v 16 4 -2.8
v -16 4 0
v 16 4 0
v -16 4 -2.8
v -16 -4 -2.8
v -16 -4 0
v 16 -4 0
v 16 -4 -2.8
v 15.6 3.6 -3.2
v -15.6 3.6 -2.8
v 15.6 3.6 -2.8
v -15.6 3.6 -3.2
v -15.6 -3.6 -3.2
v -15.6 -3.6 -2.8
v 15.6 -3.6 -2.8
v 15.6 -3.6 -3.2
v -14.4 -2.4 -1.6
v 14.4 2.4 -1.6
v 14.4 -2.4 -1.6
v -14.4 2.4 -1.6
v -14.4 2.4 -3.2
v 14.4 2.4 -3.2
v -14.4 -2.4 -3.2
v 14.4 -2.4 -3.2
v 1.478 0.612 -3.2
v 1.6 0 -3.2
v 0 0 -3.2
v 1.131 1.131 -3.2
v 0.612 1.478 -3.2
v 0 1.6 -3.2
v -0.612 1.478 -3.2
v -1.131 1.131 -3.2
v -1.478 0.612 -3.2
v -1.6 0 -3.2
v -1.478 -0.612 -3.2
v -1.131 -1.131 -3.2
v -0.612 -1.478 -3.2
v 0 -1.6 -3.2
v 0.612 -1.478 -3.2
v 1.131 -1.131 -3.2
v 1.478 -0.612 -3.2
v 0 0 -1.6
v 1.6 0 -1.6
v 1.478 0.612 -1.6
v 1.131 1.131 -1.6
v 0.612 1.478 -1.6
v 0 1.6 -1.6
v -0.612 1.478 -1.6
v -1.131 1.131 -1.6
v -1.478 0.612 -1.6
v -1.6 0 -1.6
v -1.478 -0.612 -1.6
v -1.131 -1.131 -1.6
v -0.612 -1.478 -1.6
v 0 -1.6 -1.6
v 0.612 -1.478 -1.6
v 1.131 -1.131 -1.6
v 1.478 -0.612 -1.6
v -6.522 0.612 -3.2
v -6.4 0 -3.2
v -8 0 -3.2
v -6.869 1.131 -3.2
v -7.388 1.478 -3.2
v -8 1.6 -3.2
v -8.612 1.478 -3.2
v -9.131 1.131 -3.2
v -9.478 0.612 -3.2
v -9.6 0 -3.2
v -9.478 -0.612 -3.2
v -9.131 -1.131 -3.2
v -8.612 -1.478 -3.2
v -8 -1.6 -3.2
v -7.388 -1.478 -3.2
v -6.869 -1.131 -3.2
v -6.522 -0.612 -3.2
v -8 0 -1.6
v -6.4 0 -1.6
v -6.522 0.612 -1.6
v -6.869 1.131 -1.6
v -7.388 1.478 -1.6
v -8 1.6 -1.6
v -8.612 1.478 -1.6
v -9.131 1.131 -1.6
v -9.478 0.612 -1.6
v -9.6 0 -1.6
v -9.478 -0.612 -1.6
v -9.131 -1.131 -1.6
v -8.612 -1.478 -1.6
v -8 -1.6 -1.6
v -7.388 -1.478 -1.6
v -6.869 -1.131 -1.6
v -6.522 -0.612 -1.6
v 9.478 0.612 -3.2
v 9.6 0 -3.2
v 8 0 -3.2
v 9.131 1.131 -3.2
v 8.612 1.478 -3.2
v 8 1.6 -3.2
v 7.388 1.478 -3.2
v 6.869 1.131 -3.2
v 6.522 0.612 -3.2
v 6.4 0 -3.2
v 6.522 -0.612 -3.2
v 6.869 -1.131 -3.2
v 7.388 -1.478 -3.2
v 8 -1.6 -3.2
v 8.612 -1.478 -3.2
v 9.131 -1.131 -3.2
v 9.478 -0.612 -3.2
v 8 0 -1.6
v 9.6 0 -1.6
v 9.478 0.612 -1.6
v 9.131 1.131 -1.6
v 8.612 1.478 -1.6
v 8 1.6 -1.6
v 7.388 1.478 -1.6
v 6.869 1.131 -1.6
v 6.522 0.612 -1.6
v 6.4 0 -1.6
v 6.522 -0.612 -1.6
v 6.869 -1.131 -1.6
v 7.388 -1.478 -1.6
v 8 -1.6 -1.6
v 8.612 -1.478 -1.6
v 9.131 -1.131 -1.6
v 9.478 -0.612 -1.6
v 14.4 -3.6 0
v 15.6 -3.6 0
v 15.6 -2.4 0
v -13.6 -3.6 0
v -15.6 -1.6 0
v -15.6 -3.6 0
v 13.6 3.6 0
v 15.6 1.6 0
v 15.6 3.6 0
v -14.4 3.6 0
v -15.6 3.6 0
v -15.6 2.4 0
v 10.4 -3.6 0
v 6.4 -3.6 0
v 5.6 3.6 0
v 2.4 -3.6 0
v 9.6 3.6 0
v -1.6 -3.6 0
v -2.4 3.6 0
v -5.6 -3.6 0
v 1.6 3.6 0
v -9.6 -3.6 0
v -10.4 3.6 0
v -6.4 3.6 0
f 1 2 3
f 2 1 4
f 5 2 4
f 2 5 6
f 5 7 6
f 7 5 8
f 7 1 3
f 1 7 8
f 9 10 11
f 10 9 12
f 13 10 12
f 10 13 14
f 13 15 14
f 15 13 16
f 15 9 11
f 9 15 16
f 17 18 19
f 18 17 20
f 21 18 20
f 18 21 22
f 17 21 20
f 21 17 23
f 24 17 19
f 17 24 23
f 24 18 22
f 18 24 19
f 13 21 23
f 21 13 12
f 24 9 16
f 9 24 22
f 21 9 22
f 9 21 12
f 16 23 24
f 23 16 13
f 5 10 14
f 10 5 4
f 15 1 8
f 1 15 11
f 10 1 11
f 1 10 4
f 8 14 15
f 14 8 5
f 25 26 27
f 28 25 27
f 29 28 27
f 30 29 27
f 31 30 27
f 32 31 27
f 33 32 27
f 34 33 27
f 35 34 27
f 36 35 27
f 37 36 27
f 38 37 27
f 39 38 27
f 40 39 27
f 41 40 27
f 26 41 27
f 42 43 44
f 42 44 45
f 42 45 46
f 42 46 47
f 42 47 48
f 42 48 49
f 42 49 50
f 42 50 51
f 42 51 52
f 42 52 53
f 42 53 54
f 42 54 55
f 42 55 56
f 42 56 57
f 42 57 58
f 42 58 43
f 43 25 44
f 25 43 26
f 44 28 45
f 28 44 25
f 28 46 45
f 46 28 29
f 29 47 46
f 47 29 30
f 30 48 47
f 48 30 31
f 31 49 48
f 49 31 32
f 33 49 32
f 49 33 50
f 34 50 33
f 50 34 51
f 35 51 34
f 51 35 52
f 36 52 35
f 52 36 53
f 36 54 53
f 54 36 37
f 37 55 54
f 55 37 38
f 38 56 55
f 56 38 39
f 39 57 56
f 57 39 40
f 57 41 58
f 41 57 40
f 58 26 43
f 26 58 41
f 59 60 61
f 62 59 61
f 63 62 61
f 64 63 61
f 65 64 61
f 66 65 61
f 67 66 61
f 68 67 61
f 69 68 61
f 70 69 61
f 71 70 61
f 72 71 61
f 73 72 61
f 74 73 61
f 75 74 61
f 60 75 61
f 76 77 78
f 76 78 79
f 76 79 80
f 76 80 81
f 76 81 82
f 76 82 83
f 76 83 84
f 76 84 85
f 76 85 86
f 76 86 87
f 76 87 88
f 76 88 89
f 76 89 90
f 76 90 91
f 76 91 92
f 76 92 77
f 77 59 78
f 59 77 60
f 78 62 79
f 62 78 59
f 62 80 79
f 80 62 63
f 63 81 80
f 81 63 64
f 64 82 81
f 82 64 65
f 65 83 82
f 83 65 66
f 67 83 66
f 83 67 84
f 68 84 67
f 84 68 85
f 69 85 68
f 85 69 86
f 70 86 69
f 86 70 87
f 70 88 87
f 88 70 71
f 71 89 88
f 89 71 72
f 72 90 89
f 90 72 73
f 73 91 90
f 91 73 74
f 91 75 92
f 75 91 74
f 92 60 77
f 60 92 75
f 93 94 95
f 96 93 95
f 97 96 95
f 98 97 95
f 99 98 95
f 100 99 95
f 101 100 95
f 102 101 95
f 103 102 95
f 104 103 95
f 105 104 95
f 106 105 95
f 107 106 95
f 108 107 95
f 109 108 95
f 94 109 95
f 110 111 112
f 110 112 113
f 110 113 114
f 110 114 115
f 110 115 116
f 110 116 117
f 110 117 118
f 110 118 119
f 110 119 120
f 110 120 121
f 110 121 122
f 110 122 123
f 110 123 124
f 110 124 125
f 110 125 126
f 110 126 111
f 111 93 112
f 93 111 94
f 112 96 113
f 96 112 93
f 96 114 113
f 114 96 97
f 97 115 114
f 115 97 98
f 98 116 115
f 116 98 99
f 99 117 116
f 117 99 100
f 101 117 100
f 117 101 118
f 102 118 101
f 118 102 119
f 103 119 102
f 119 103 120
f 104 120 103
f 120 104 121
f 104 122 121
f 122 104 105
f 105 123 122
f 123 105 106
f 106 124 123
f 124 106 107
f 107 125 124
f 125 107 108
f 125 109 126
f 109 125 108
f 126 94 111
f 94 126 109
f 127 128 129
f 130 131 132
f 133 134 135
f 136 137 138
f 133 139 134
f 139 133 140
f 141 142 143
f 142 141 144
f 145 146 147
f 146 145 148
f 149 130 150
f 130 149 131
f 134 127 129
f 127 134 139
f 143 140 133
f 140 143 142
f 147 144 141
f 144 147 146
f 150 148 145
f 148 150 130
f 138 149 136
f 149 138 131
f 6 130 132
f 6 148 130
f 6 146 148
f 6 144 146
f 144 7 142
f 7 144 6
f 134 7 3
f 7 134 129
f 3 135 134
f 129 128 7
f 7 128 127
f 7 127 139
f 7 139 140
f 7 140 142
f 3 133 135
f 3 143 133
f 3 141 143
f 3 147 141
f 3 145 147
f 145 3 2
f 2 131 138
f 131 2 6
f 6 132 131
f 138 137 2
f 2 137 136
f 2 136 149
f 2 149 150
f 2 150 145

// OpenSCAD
// file: ../p/4-4edge.scad
use <../lib.scad>
function ldraw_lib__4_4edge() = [
// 0 Circle 1.0
// 0 Name: 4-4edge.dat
// 0 Author: James Jessiman
// 0 !LDRAW_ORG Primitive UPDATE 2017-01
// 0 !LICENSE Licensed under CC BY 2.0 and CC BY 4.0 : see CAreadme.txt
// 
// 0 BFC CERTIFY CCW
  [0,"BFC","CERTIFY"],
  [0,"BFC","CCW"],
// 
// 0 !HISTORY 1998-12-15 [PTadmin] Official Update 1998-10
// 0 !HISTORY 2005-12-28 [PTadmin] Official Update 2005-01
// 0 !HISTORY 2007-06-24 [PTadmin] Header formatted for Contributor Agreement
// 0 !HISTORY 2008-07-01 [PTadmin] Official Update 2008-01
// 0 !HISTORY 2017-01-15 [Steffen] BFCed
// 0 !HISTORY 2017-12-30 [PTadmin] Official Update 2017-01
// 
// 
// 2 24 1 0 0 0.9239 0 0.3827
  [2,24,1,0,0,0.9239,0,0.3827],
// 2 24 0.9239 0 0.3827 0.7071 0 0.7071
  [2,24,0.9239,0,0.3827,0.7071,0,0.7071],
// 2 24 0.7071 0 0.7071 0.3827 0 0.9239
  [2,24,0.7071,0,0.7071,0.3827,0,0.9239],
// 2 24 0.3827 0 0.9239 0 0 1
  [2,24,0.3827,0,0.9239,0,0,1],
// 2 24 0 0 1 -0.3827 0 0.9239
  [2,24,0,0,1,-0.3827,0,0.9239],
// 2 24 -0.3827 0 0.9239 -0.7071 0 0.7071
  [2,24,-0.3827,0,0.9239,-0.7071,0,0.7071],
// 2 24 -0.7071 0 0.7071 -0.9239 0 0.3827
  [2,24,-0.7071,0,0.7071,-0.9239,0,0.3827],
// 2 24 -0.9239 0 0.3827 -1 0 -0
  [2,24,-0.9239,0,0.3827,-1,0,-0],
// 2 24 -1 0 -0 -0.9239 0 -0.3827
  [2,24,-1,0,-0,-0.9239,0,-0.3827],
// 2 24 -0.9239 0 -0.3827 -0.7071 0 -0.7071
  [2,24,-0.9239,0,-0.3827,-0.7071,0,-0.7071],
// 2 24 -0.7071 0 -0.7071 -0.3827 0 -0.9239
  [2,24,-0.7071,0,-0.7071,-0.3827,0,-0.9239],
// 2 24 -0.3827 0 -0.9239 0 0 -1
  [2,24,-0.3827,0,-0.9239,0,0,-1],
// 2 24 0 0 -1 0.3827 0 -0.9239
  [2,24,0,0,-1,0.3827,0,-0.9239],
// 2 24 0.3827 0 -0.9239 0.7071 0 -0.7071
  [2,24,0.3827,0,-0.9239,0.7071,0,-0.7071],
// 2 24 0.7071 0 -0.7071 0.9239 0 -0.3827
  [2,24,0.7071,0,-0.7071,0.9239,0,-0.3827],
// 2 24 0.9239 0 -0.3827 1 0 0
  [2,24,0.9239,0,-0.3827,1,0,0],
];
module ldraw_lib__4_4edge(step=0, col=false, unit=2/5, alt=false, line=0.2, solid=!$preview)
    makepoly(ldraw_lib__4_4edge(), step=step, col=col, unit=unit, alt=alt, line=line, solid=solid);
ldraw_lib__4_4edge(line=0.2);
// file: ../p/4-4disc.scad
use <../lib.scad>
function ldraw_lib__4_4disc() = [
// 0 Disc 1.0
// 0 Name: 4-4disc.dat
// 0 Author: James Jessiman
// 0 !LDRAW_ORG Primitive UPDATE 2002-02
// 0 !LICENSE Licensed under CC BY 2.0 and CC BY 4.0 : see CAreadme.txt
// 
// 0 BFC CERTIFY CCW
  [0,"BFC","CERTIFY"],
  [0,"BFC","CCW"],
// 
// 0 !HISTORY 1998-12-15 [PTadmin] Official Update 1998-10
// 0 !HISTORY 2002-03-23 [sbliss] Added BFC statement
// 0 !HISTORY 2002-04-25 [PTadmin] Official Update 2002-02
// 0 !HISTORY 2007-06-24 [PTadmin] Header formatted for Contributor Agreement
// 0 !HISTORY 2008-07-01 [PTadmin] Official Update 2008-01
// 
// 
// 3 16 0 0 0 1 0 0 0.9239 0 0.3827
  [3,16,0,0,0,1,0,0,0.9239,0,0.3827],
// 3 16 0 0 0 0.9239 0 0.3827 0.7071 0 0.7071
  [3,16,0,0,0,0.9239,0,0.3827,0.7071,0,0.7071],
// 3 16 0 0 0 0.7071 0 0.7071 0.3827 0 0.9239
  [3,16,0,0,0,0.7071,0,0.7071,0.3827,0,0.9239],
// 3 16 0 0 0 0.3827 0 0.9239 0 0 1
  [3,16,0,0,0,0.3827,0,0.9239,0,0,1],
// 3 16 0 0 0 0 0 1 -0.3827 0 0.9239
  [3,16,0,0,0,0,0,1,-0.3827,0,0.9239],
// 3 16 0 0 0 -0.3827 0 0.9239 -0.7071 0 0.7071
  [3,16,0,0,0,-0.3827,0,0.9239,-0.7071,0,0.7071],
// 3 16 0 0 0 -0.7071 0 0.7071 -0.9239 0 0.3827
  [3,16,0,0,0,-0.7071,0,0.7071,-0.9239,0,0.3827],
// 3 16 0 0 0 -0.9239 0 0.3827 -1 0 -0
  [3,16,0,0,0,-0.9239,0,0.3827,-1,0,-0],
// 3 16 0 0 0 -1 0 -0 -0.9239 0 -0.3827
  [3,16,0,0,0,-1,0,-0,-0.9239,0,-0.3827],
// 3 16 0 0 0 -0.9239 0 -0.3827 -0.7071 0 -0.7071
  [3,16,0,0,0,-0.9239,0,-0.3827,-0.7071,0,-0.7071],
// 3 16 0 0 0 -0.7071 0 -0.7071 -0.3827 0 -0.9239
  [3,16,0,0,0,-0.7071,0,-0.7071,-0.3827,0,-0.9239],
// 3 16 0 0 0 -0.3827 0 -0.9239 0 0 -1
  [3,16,0,0,0,-0.3827,0,-0.9239,0,0,-1],
// 3 16 0 0 0 0 0 -1 0.3827 0 -0.9239
  [3,16,0,0,0,0,0,-1,0.3827,0,-0.9239],
// 3 16 0 0 0 0.3827 0 -0.9239 0.7071 0 -0.7071
  [3,16,0,0,0,0.3827,0,-0.9239,0.7071,0,-0.7071],
// 3 16 0 0 0 0.7071 0 -0.7071 0.9239 0 -0.3827
  [3,16,0,0,0,0.7071,0,-0.7071,0.9239,0,-0.3827],
// 3 16 0 0 0 0.9239 0 -0.3827 1 0 0
  [3,16,0,0,0,0.9239,0,-0.3827,1,0,0],
// 0
];
module ldraw_lib__4_4disc(step=0, col=false, unit=2/5, alt=false, line=0.2, solid=!$preview)
    makepoly(ldraw_lib__4_4disc(), step=step, col=col, unit=unit, alt=alt, line=line, solid=solid);
ldraw_lib__4_4disc(line=0.2);
// file: ../p/4-4cyli.scad
use <../lib.scad>
$fa=1; $fs=0.2;
function ldraw_lib__4_4cyli(realsolid=false) = [
// 0 Cylinder 1.0
// 0 Name: 4-4cyli.dat
// 0 Author: James Jessiman
// 0 !LDRAW_ORG Primitive UPDATE 2005-01
// 0 !LICENSE Licensed under CC BY 2.0 and CC BY 4.0 : see CAreadme.txt
// 
// 0 BFC CERTIFY CCW
  [0,"BFC","CERTIFY"],
  [0,"BFC","CCW"],
// 
// 0 !HISTORY 1998-12-15 [PTadmin] Official Update 1998-10
// 0 !HISTORY 2002-03-23 [sbliss] Added BFC statement; merged headers from files in distributions LDraw 0.27 and Complete.
// 0 !HISTORY 2002-04-25 [PTadmin] Official Update 2002-02
// 0 !HISTORY 2004-12-14 [guyvivan] BFC CCW
// 0 !HISTORY 2005-12-28 [PTadmin] Official Update 2005-01
// 0 !HISTORY 2007-06-24 [PTadmin] Header formatted for Contributor Agreement
// 0 !HISTORY 2008-07-01 [PTadmin] Official Update 2008-01
// 
// 
// 4 16 1 1 0 0.9239 1 0.3827 0.9239 0 0.3827 1 0 0
  [4,16,1,1,0,0.9239,1,0.3827,0.9239,0,0.3827,1,0,0],
// 5 24 1 0 0 1 1 0 0.9239 0 0.3827 0.9239 0 -0.3827
  [5,24,1,0,0,1,1,0,0.9239,0,0.3827,0.9239,0,-0.3827],
// 4 16 0.9239 1 0.3827 0.7071 1 0.7071 0.7071 0 0.7071 0.9239 0 0.3827
  [4,16,0.9239,1,0.3827,0.7071,1,0.7071,0.7071,0,0.7071,0.9239,0,0.3827],
// 5 24 0.9239 0 0.3827 0.9239 1 0.3827 0.7071 0 0.7071 1 0 0
  [5,24,0.9239,0,0.3827,0.9239,1,0.3827,0.7071,0,0.7071,1,0,0],
// 4 16 0.7071 1 0.7071 0.3827 1 0.9239 0.3827 0 0.9239 0.7071 0 0.7071
  [4,16,0.7071,1,0.7071,0.3827,1,0.9239,0.3827,0,0.9239,0.7071,0,0.7071],
// 5 24 0.7071 0 0.7071 0.7071 1 0.7071 0.3827 0 0.9239 0.9239 0 0.3827
  [5,24,0.7071,0,0.7071,0.7071,1,0.7071,0.3827,0,0.9239,0.9239,0,0.3827],
// 4 16 0.3827 1 0.9239 0 1 1 0 0 1 0.3827 0 0.9239
  [4,16,0.3827,1,0.9239,0,1,1,0,0,1,0.3827,0,0.9239],
// 5 24 0.3827 0 0.9239 0.3827 1 0.9239 0 0 1 0.7071 0 0.7071
  [5,24,0.3827,0,0.9239,0.3827,1,0.9239,0,0,1,0.7071,0,0.7071],
// 4 16 0 1 1 -0.3827 1 0.9239 -0.3827 0 0.9239 0 0 1
  [4,16,0,1,1,-0.3827,1,0.9239,-0.3827,0,0.9239,0,0,1],
// 5 24 0 0 1 0 1 1 -0.3827 0 0.9239 0.3827 0 0.9239
  [5,24,0,0,1,0,1,1,-0.3827,0,0.9239,0.3827,0,0.9239],
// 4 16 -0.3827 1 0.9239 -0.7071 1 0.7071 -0.7071 0 0.7071 -0.3827 0 0.9239
  [4,16,-0.3827,1,0.9239,-0.7071,1,0.7071,-0.7071,0,0.7071,-0.3827,0,0.9239],
// 5 24 -0.3827 0 0.9239 -0.3827 1 0.9239 -0.7071 0 0.7071 0 0 1
  [5,24,-0.3827,0,0.9239,-0.3827,1,0.9239,-0.7071,0,0.7071,0,0,1],
// 4 16 -0.7071 1 0.7071 -0.9239 1 0.3827 -0.9239 0 0.3827 -0.7071 0 0.7071
  [4,16,-0.7071,1,0.7071,-0.9239,1,0.3827,-0.9239,0,0.3827,-0.7071,0,0.7071],
// 5 24 -0.7071 0 0.7071 -0.7071 1 0.7071 -0.9239 0 0.3827 -0.3827 0 0.9239
  [5,24,-0.7071,0,0.7071,-0.7071,1,0.7071,-0.9239,0,0.3827,-0.3827,0,0.9239],
// 4 16 -0.9239 1 0.3827 -1 1 0 -1 0 0 -0.9239 0 0.3827
  [4,16,-0.9239,1,0.3827,-1,1,0,-1,0,0,-0.9239,0,0.3827],
// 5 24 -0.9239 0 0.3827 -0.9239 1 0.3827 -1 0 0 -0.7071 0 0.7071
  [5,24,-0.9239,0,0.3827,-0.9239,1,0.3827,-1,0,0,-0.7071,0,0.7071],
// 4 16 -1 1 0 -0.9239 1 -0.3827 -0.9239 0 -0.3827 -1 0 0
  [4,16,-1,1,0,-0.9239,1,-0.3827,-0.9239,0,-0.3827,-1,0,0],
// 5 24 -1 0 0 -1 1 0 -0.9239 0 -0.3827 -0.9239 0 0.3827
  [5,24,-1,0,0,-1,1,0,-0.9239,0,-0.3827,-0.9239,0,0.3827],
// 4 16 -0.9239 1 -0.3827 -0.7071 1 -0.7071 -0.7071 0 -0.7071 -0.9239 0 -0.3827
  [4,16,-0.9239,1,-0.3827,-0.7071,1,-0.7071,-0.7071,0,-0.7071,-0.9239,0,-0.3827],
// 5 24 -0.9239 0 -0.3827 -0.9239 1 -0.3827 -0.7071 0 -0.7071 -1 0 0
  [5,24,-0.9239,0,-0.3827,-0.9239,1,-0.3827,-0.7071,0,-0.7071,-1,0,0],
// 4 16 -0.7071 1 -0.7071 -0.3827 1 -0.9239 -0.3827 0 -0.9239 -0.7071 0 -0.7071
  [4,16,-0.7071,1,-0.7071,-0.3827,1,-0.9239,-0.3827,0,-0.9239,-0.7071,0,-0.7071],
// 5 24 -0.7071 0 -0.7071 -0.7071 1 -0.7071 -0.3827 0 -0.9239 -0.9239 0 -0.3827
  [5,24,-0.7071,0,-0.7071,-0.7071,1,-0.7071,-0.3827,0,-0.9239,-0.9239,0,-0.3827],
// 4 16 -0.3827 1 -0.9239 0 1 -1 0 0 -1 -0.3827 0 -0.9239
  [4,16,-0.3827,1,-0.9239,0,1,-1,0,0,-1,-0.3827,0,-0.9239],
// 5 24 -0.3827 0 -0.9239 -0.3827 1 -0.9239 0 0 -1 -0.7071 0 -0.7071
  [5,24,-0.3827,0,-0.9239,-0.3827,1,-0.9239,0,0,-1,-0.7071,0,-0.7071],
// 4 16 0 1 -1 0.3827 1 -0.9239 0.3827 0 -0.9239 0 0 -1
  [4,16,0,1,-1,0.3827,1,-0.9239,0.3827,0,-0.9239,0,0,-1],
// 5 24 0 0 -1 0 1 -1 0.3827 0 -0.9239 -0.3827 0 -0.9239
  [5,24,0,0,-1,0,1,-1,0.3827,0,-0.9239,-0.3827,0,-0.9239],
// 4 16 0.3827 1 -0.9239 0.7071 1 -0.7071 0.7071 0 -0.7071 0.3827 0 -0.9239
  [4,16,0.3827,1,-0.9239,0.7071,1,-0.7071,0.7071,0,-0.7071,0.3827,0,-0.9239],
// 5 24 0.3827 0 -0.9239 0.3827 1 -0.9239 0.7071 0 -0.7071 0 0 -1
  [5,24,0.3827,0,-0.9239,0.3827,1,-0.9239,0.7071,0,-0.7071,0,0,-1],
// 4 16 0.7071 1 -0.7071 0.9239 1 -0.3827 0.9239 0 -0.3827 0.7071 0 -0.7071
  [4,16,0.7071,1,-0.7071,0.9239,1,-0.3827,0.9239,0,-0.3827,0.7071,0,-0.7071],
// 5 24 0.7071 0 -0.7071 0.7071 1 -0.7071 0.9239 0 -0.3827 0.3827 0 -0.9239
  [5,24,0.7071,0,-0.7071,0.7071,1,-0.7071,0.9239,0,-0.3827,0.3827,0,-0.9239],
// 4 16 0.9239 1 -0.3827 1 1 0 1 0 0 0.9239 0 -0.3827
  [4,16,0.9239,1,-0.3827,1,1,0,1,0,0,0.9239,0,-0.3827],
// 5 24 0.9239 0 -0.3827 0.9239 1 -0.3827 1 0 0 0.7071 0 -0.7071
  [5,24,0.9239,0,-0.3827,0.9239,1,-0.3827,1,0,0,0.7071,0,-0.7071],
// 0
];
module ldraw_lib__4_4cyli(step=0, col=false, unit=2/5, alt=false, line=0.2, solid=!$preview)
    makepoly(ldraw_lib__4_4cyli(solid), step=step, col=col, unit=unit, alt=alt, line=line, solid=solid);
ldraw_lib__4_4cyli(line=0.2);
// file: ../p/stud3.scad
use <../lib.scad>
use <4-4cyli.scad>
use <4-4disc.scad>
use <4-4edge.scad>
function ldraw_lib__stud3() = [
// 0 Stud Tube Solid
// 0 Name: stud3.dat
// 0 Author: James Jessiman
// 0 !LDRAW_ORG Primitive UPDATE 2012-01
// 0 !LICENSE Licensed under CC BY 4.0 : see CAreadme.txt
// 
// 0 BFC CERTIFY CCW
  [0,"BFC","CERTIFY"],
  [0,"BFC","CCW"],
// 
// 0 !HISTORY 2002-04-04 [sbliss] Modified for BFC compliance
// 0 !HISTORY 2002-04-25 [PTadmin] Official Update 2002-02
// 0 !HISTORY 2007-06-24 [PTadmin] Header formatted for Contributor Agreement
// 0 !HISTORY 2008-07-01 [PTadmin] Official Update 2008-01
// 0 !HISTORY 2012-02-16 [Philo] Changed to CCW
// 0 !HISTORY 2012-03-30 [PTadmin] Official Update 2012-01
// 
// 
// 1 16 0 -4 0 4 0 0 0 1 0 0 0 4 4-4edge.dat
  [1,16,0,-4,0,4,0,0,0,1,0,0,0,4, ldraw_lib__4_4edge()],
// 1 16 0 0 0 4 0 0 0 1 0 0 0 4 4-4edge.dat
  [1,16,0,0,0,4,0,0,0,1,0,0,0,4, ldraw_lib__4_4edge()],
// 1 16 0 -4 0 4 0 0 0 1 0 0 0 4 4-4disc.dat
  [1,16,0,-4,0,4,0,0,0,1,0,0,0,4, ldraw_lib__4_4disc()],
  [-1,16,0,0,0,4,0,0,0,-1,0,0,0,4, ldraw_lib__4_4disc()],
// 1 16 0 -4 0 4 0 0 0 4 0 0 0 4 4-4cyli.dat
  [1,16,0,-4,0,4,0,0,0,4,0,0,0,4, ldraw_lib__4_4cyli()],
];
module ldraw_lib__stud3(step=0, col=false, unit=2/5, alt=false, line=0.2, solid=!$preview)
    makepoly(ldraw_lib__stud3(), step=step, col=col, unit=unit, alt=alt, line=line, solid=solid);
ldraw_lib__stud3(line=0.2);
// file: ../p/box5.scad
use <../lib.scad>
function ldraw_lib__box5() = [
// 0 Box with 5 Faces and All Edges
// 0 Name: box5.dat
// 0 Author: James Jessiman
// 0 !LDRAW_ORG Primitive UPDATE 2012-01
// 0 !LICENSE Licensed under CC BY 2.0 and CC BY 4.0 : see CAreadme.txt
// 
// 0 BFC CERTIFY CCW
  [0,"BFC","CERTIFY"],
  [0,"BFC","CCW"],
// 
// 0 !HISTORY 2002-04-03 [sbliss] Modified for BFC compliance
// 0 !HISTORY 2002-04-25 [PTadmin] Official Update 2002-02
// 0 !HISTORY 2007-06-24 [PTadmin] Header formatted for Contributor Agreement
// 0 !HISTORY 2008-07-01 [PTadmin] Official Update 2008-01
// 0 !HISTORY 2012-02-16 [Philo] Changed to CCW
// 0 !HISTORY 2012-03-30 [PTadmin] Official Update 2012-01
// 
// 
// 2 24 1 1 1 -1 1 1
  [2,24,1,1,1,-1,1,1],
// 2 24 -1 1 1 -1 1 -1
  [2,24,-1,1,1,-1,1,-1],
// 2 24 -1 1 -1 1 1 -1
  [2,24,-1,1,-1,1,1,-1],
// 2 24 1 1 -1 1 1 1
  [2,24,1,1,-1,1,1,1],
// 2 24 1 0 1 -1 0 1
  [2,24,1,0,1,-1,0,1],
// 2 24 -1 0 1 -1 0 -1
  [2,24,-1,0,1,-1,0,-1],
// 2 24 -1 0 -1 1 0 -1
  [2,24,-1,0,-1,1,0,-1],
// 2 24 1 0 -1 1 0 1
  [2,24,1,0,-1,1,0,1],
// 2 24 1 0 1 1 1 1
  [2,24,1,0,1,1,1,1],
// 2 24 -1 0 1 -1 1 1
  [2,24,-1,0,1,-1,1,1],
// 2 24 1 0 -1 1 1 -1
  [2,24,1,0,-1,1,1,-1],
// 2 24 -1 0 -1 -1 1 -1
  [2,24,-1,0,-1,-1,1,-1],
// 4 16 -1 1 1 1 1 1 1 1 -1 -1 1 -1
  [4,16,-1,1,1,1,1,1,1,1,-1,-1,1,-1],
// 4 16 -1 1 1 -1 0 1 1 0 1 1 1 1
  [4,16,-1,1,1,-1,0,1,1,0,1,1,1,1],
// 4 16 -1 1 -1 -1 0 -1 -1 0 1 -1 1 1
  [4,16,-1,1,-1,-1,0,-1,-1,0,1,-1,1,1],
// 4 16 1 1 -1 1 0 -1 -1 0 -1 -1 1 -1
  [4,16,1,1,-1,1,0,-1,-1,0,-1,-1,1,-1],
// 4 16 1 1 1 1 0 1 1 0 -1 1 1 -1
  [4,16,1,1,1,1,0,1,1,0,-1,1,1,-1],
];
makepoly(ldraw_lib__box5(), line=0.2);
// file: ../p/box4.scad
use <../lib.scad>
function ldraw_lib__box4() = [
// 0 Box with 4 Faces (2 Parallel Pairs) and All Edges
// 0 Name: box4.dat
// 0 Author: James Jessiman
// 0 !LDRAW_ORG Primitive UPDATE 2012-01
// 0 !LICENSE Licensed under CC BY 4.0 : see CAreadme.txt
// 
// 0 BFC CERTIFY CCW
  [0,"BFC","CERTIFY"],
  [0,"BFC","CCW"],
// 
// 0 !HISTORY 2002-04-03 [sbliss] Modified for BFC compliance
// 0 !HISTORY 2002-04-25 [PTadmin] Official Update 2002-02
// 0 !HISTORY 2007-06-24 [PTadmin] Header formatted for Contributor Agreement
// 0 !HISTORY 2008-07-01 [PTadmin] Official Update 2008-01
// 0 !HISTORY 2012-02-16 [Philo] Changed to CCW
// 0 !HISTORY 2012-03-30 [PTadmin] Official Update 2012-01
// 
// 
// 2 24 1 1 1 -1 1 1
  [2,24,1,1,1,-1,1,1],
// 2 24 -1 1 1 -1 1 -1
  [2,24,-1,1,1,-1,1,-1],
// 2 24 -1 1 -1 1 1 -1
  [2,24,-1,1,-1,1,1,-1],
// 2 24 1 1 -1 1 1 1
  [2,24,1,1,-1,1,1,1],
// 2 24 1 0 1 -1 0 1
  [2,24,1,0,1,-1,0,1],
// 2 24 -1 0 1 -1 0 -1
  [2,24,-1,0,1,-1,0,-1],
// 2 24 -1 0 -1 1 0 -1
  [2,24,-1,0,-1,1,0,-1],
// 2 24 1 0 -1 1 0 1
  [2,24,1,0,-1,1,0,1],
// 2 24 1 0 1 1 1 1
  [2,24,1,0,1,1,1,1],
// 2 24 -1 0 1 -1 1 1
  [2,24,-1,0,1,-1,1,1],
// 2 24 1 0 -1 1 1 -1
  [2,24,1,0,-1,1,1,-1],
// 2 24 -1 0 -1 -1 1 -1
  [2,24,-1,0,-1,-1,1,-1],
// 4 16 -1 1 1 -1 0 1 1 0 1 1 1 1
  [4,16,-1,1,1,-1,0,1,1,0,1,1,1,1],
// 4 16 -1 1 -1 -1 0 -1 -1 0 1 -1 1 1
  [4,16,-1,1,-1,-1,0,-1,-1,0,1,-1,1,1],
// 4 16 1 1 -1 1 0 -1 -1 0 -1 -1 1 -1
  [4,16,1,1,-1,1,0,-1,-1,0,-1,-1,1,-1],
// 4 16 1 1 1 1 0 1 1 0 -1 1 1 -1
  [4,16,1,1,1,1,0,1,1,0,-1,1,1,-1],
];
module ldraw_lib__box4(step=0, col=false, unit=2/5, alt=false, line=0.2, solid=!$preview)
    makepoly(ldraw_lib__box4(), step=step, col=col, unit=unit, alt=alt, line=line, solid=solid);
ldraw_lib__box4(line=0.2);
// file: s/2431s01.scad
use <../../lib.scad>
use <../../p/box4.scad>
use <../../p/box5.scad>
use <../../p/stud3.scad>
function ldraw_lib__s__2431s01() = [
// 0 ~Tile  1 x  4 with Groove without Top Face
// 0 Name: s\2431s01.dat
// 0 Author: Santeri Piippo [arezey]
// 0 !LDRAW_ORG Subpart UPDATE 2010-02
// 0 !LICENSE Licensed under CC BY 2.0 and CC BY 4.0 : see CAreadme.txt
// 
// 0 BFC CERTIFY CCW
  [0,"BFC","CERTIFY"],
  [0,"BFC","CCW"],
// 
// 0 !HISTORY 2010-07-05 [PTadmin] Official Update 2010-02
// 
// 
// 1 16 0 0 0 40 0 0 0 7 0 0 0 10 box4.dat
  [1,16,0,0,0,40,0,0,0,7,0,0,0,10, ldraw_lib__box4()],
// 1 16 0 7 0 39 0 0 0 1 0 0 0 9 box4.dat
  [1,16,0,7,0,39,0,0,0,1,0,0,0,9, ldraw_lib__box4()],
// 0 BFC INVERTNEXT
  [0,"BFC","INVERTNEXT"],
// 1 16 0 8 0 36 0 0 0 -4 0 0 0 6 box5.dat
  [1,16,0,8,0,36,0,0,0,-4,0,0,0,6, ldraw_lib__box5()],
// 4 16 -39 8 9 -36 8 6 -36 8 -6 -39 8 -9
  [4,16,-39,8,9,-36,8,6,-36,8,-6,-39,8,-9],
// 4 16 39 8 -9 36 8 -6 36 8 6 39 8 9
  [4,16,39,8,-9,36,8,-6,36,8,6,39,8,9],
// 4 16 39 8 9 36 8 6 -36 8 6 -39 8 9
  [4,16,39,8,9,36,8,6,-36,8,6,-39,8,9],
// 4 16 -39 8 -9 -36 8 -6 36 8 -6 39 8 -9
  [4,16,-39,8,-9,-36,8,-6,36,8,-6,39,8,-9],
// 4 16 -40 7 10 -39 7 9 -39 7 -9 -40 7 -10
  [4,16,-40,7,10,-39,7,9,-39,7,-9,-40,7,-10],
// 4 16 40 7 -10 39 7 -9 39 7 9 40 7 10
  [4,16,40,7,-10,39,7,-9,39,7,9,40,7,10],
// 4 16 40 7 10 39 7 9 -39 7 9 -40 7 10
  [4,16,40,7,10,39,7,9,-39,7,9,-40,7,10],
// 4 16 -40 7 -10 -39 7 -9 39 7 -9 40 7 -10
  [4,16,-40,7,-10,-39,7,-9,39,7,-9,40,7,-10],
// 1 16 0 4 0 1 0 0 0 -1 0 0 0 1 stud3.dat
  [1,16,0,4,0,1,0,0,0,-1,0,0,0,1, ldraw_lib__stud3()],
// 1 16 -20 4 0 1 0 0 0 -1 0 0 0 1 stud3.dat
  [1,16,-20,4,0,1,0,0,0,-1,0,0,0,1, ldraw_lib__stud3()],
// 1 16 20 4 0 1 0 0 0 -1 0 0 0 1 stud3.dat
  [1,16,20,4,0,1,0,0,0,-1,0,0,0,1, ldraw_lib__stud3()],
// 0 //
];
makepoly(ldraw_lib__s__2431s01(), line=0.2);
// file: s/2431p02s03.scad
use <../../lib.scad>
function ldraw_lib__s__2431p02s03() = [
// 0 ~Tile  1 x  4 with Red Danger Stripes Pattern - Half Border
// 0 Name: s\2431p02s03.dat
// 0 Author: Marc Giraudet [Mad_Marc]
// 0 !LDRAW_ORG Subpart UPDATE 2024-06
// 0 !LICENSE Licensed under CC BY 4.0 : see CAreadme.txt
// 
// 0 BFC CERTIFY CCW
  [0,"BFC","CERTIFY"],
  [0,"BFC","CCW"],
// 
// 0 !HISTORY 2024-07-29 [OrionP] Official Update 2024-06
// 
// 3 16 -40 0 -10 -34 0 -9 -39 0 -9
  [3,16,-40,0,-10,-34,0,-9,-39,0,-9],
// 3 16 -40 0 -10 -24 0 -9 -34 0 -9
  [3,16,-40,0,-10,-24,0,-9,-34,0,-9],
// 3 16 -40 0 -10 -14 0 -9 -24 0 -9
  [3,16,-40,0,-10,-14,0,-9,-24,0,-9],
// 3 16 -40 0 -10 -4 0 -9 -14 0 -9
  [3,16,-40,0,-10,-4,0,-9,-14,0,-9],
// 4 16 -40 0 -10 40 0 -10 6 0 -9 -4 0 -9
  [4,16,-40,0,-10,40,0,-10,6,0,-9,-4,0,-9],
// 4 16 40 0 10 39 0 4 39 0 -6 40 0 -10
  [4,16,40,0,10,39,0,4,39,0,-6,40,0,-10],
// 3 16 40 0 10 39 0 9 39 0 4
  [3,16,40,0,10,39,0,9,39,0,4],
// 3 16 39 0 -6 39 0 -9 40 0 -10
  [3,16,39,0,-6,39,0,-9,40,0,-10],
// 3 16 40 0 -10 39 0 -9 36 0 -9
  [3,16,40,0,-10,39,0,-9,36,0,-9],
// 3 16 40 0 -10 36 0 -9 26 0 -9
  [3,16,40,0,-10,36,0,-9,26,0,-9],
// 3 16 40 0 -10 26 0 -9 16 0 -9
  [3,16,40,0,-10,26,0,-9,16,0,-9],
// 3 16 40 0 -10 16 0 -9 6 0 -9
  [3,16,40,0,-10,16,0,-9,6,0,-9],
];
module ldraw_lib__s__2431p02s03(step=0, col=false, unit=2/5, alt=false, line=0.2, solid=!$preview)
    makepoly(ldraw_lib__s__2431p02s03(), step=step, col=col, unit=unit, alt=alt, line=line, solid=solid);
ldraw_lib__s__2431p02s03(line=0.2);
// file: s/2431p02s02.scad
use <../../lib.scad>
function ldraw_lib__s__2431p02s02() = [
// 0 ~Tile  1 x  4 with Danger Stripes Red Pattern - Zag
// 0 Name: s\2431p02s02.dat
// 0 Author: Marc Giraudet [Mad_Marc]
// 0 !LDRAW_ORG Subpart UPDATE 2024-06
// 0 !LICENSE Licensed under CC BY 4.0 : see CAreadme.txt
// 
// 0 BFC CERTIFY CCW
  [0,"BFC","CERTIFY"],
  [0,"BFC","CCW"],
// 
// 0 !HISTORY 2024-07-29 [OrionP] Official Update 2024-06
// 
// 4 16 39 0 4 26 0 -9 36 0 -9 39 0 -6
  [4,16,39,0,4,26,0,-9,36,0,-9,39,0,-6],
// 4 16 24 0 9 6 0 -9 16 0 -9 34 0 9
  [4,16,24,0,9,6,0,-9,16,0,-9,34,0,9],
// 4 16 4 0 9 -14 0 -9 -4 0 -9 14 0 9
  [4,16,4,0,9,-14,0,-9,-4,0,-9,14,0,9],
// 4 16 -16 0 9 -34 0 -9 -24 0 -9 -6 0 9
  [4,16,-16,0,9,-34,0,-9,-24,0,-9,-6,0,9],
// 4 16 -36 0 9 -39 0 6 -39 0 -4 -26 0 9
  [4,16,-36,0,9,-39,0,6,-39,0,-4,-26,0,9],
];
module ldraw_lib__s__2431p02s02(step=0, col=false, unit=2/5, alt=false, line=0.2, solid=!$preview)
    makepoly(ldraw_lib__s__2431p02s02(), step=step, col=col, unit=unit, alt=alt, line=line, solid=solid);
ldraw_lib__s__2431p02s02(line=0.2);
// file: s/2431p02s01.scad
use <../../lib.scad>
function ldraw_lib__s__2431p02s01() = [
// 0 ~Tile  1 x  4 with Danger Stripes Red Pattern - Zig
// 0 Name: s\2431p02s01.dat
// 0 Author: Marc Giraudet [Mad_Marc]
// 0 !LDRAW_ORG Subpart UPDATE 2024-06
// 0 !LICENSE Licensed under CC BY 4.0 : see CAreadme.txt
// 
// 0 BFC CERTIFY CCW
  [0,"BFC","CERTIFY"],
  [0,"BFC","CCW"],
// 
// 0 !HISTORY 2024-07-29 [OrionP] Official Update 2024-06
// 
// 3 16 36 0 -9 39 0 -9 39 0 -6
  [3,16,36,0,-9,39,0,-9,39,0,-6],
// 3 16 -34 0 -9 -39 0 -4 -39 0 -9
  [3,16,-34,0,-9,-39,0,-4,-39,0,-9],
// 3 16 34 0 9 39 0 4 39 0 9
  [3,16,34,0,9,39,0,4,39,0,9],
// 3 16 -36 0 9 -39 0 9 -39 0 6
  [3,16,-36,0,9,-39,0,9,-39,0,6],
// 4 16 34 0 9 16 0 -9 26 0 -9 39 0 4
  [4,16,34,0,9,16,0,-9,26,0,-9,39,0,4],
// 4 16 14 0 9 -4 0 -9 6 0 -9 24 0 9
  [4,16,14,0,9,-4,0,-9,6,0,-9,24,0,9],
// 4 16 -6 0 9 -24 0 -9 -14 0 -9 4 0 9
  [4,16,-6,0,9,-24,0,-9,-14,0,-9,4,0,9],
// 4 16 -39 0 -4 -34 0 -9 -16 0 9 -26 0 9
  [4,16,-39,0,-4,-34,0,-9,-16,0,9,-26,0,9],
];
module ldraw_lib__s__2431p02s01(step=0, col=false, unit=2/5, alt=false, line=0.2, solid=!$preview)
    makepoly(ldraw_lib__s__2431p02s01(), step=step, col=col, unit=unit, alt=alt, line=line, solid=solid);
ldraw_lib__s__2431p02s01(line=0.2);
// main file
use <../lib.scad>
use <s/2431p02s01.scad>
use <s/2431p02s02.scad>
use <s/2431p02s03.scad>
use <s/2431s01.scad>
function ldraw_lib__2431p52() = [
// 0 Tile  1 x  4 with Black Danger Stripes Type 2 Pattern
// 0 Name: 2431p52.dat
// 0 Author: Marc Giraudet [Mad_Marc]
// 0 !LDRAW_ORG Part UPDATE 2024-07
// 0 !LICENSE Licensed under CC BY 4.0 : see CAreadme.txt
// 
// 0 BFC CERTIFY CCW
  [0,"BFC","CERTIFY"],
  [0,"BFC","CCW"],
// 
// 0 !KEYWORDS BrickLink 2431pb725, Rebrickable 2431pr0158, Set 60252
// 
// 0 !HISTORY 2024-07-08 [Mad_Marc] Original design by Jonathan Wilson
// 0 !HISTORY 2024-08-26 [OrionP] Official Update 2024-07
// 
// 1 16 0 0 0 1 0 0 0 1 0 0 0 1 s\2431s01.dat
  [1,16,0,0,0,1,0,0,0,1,0,0,0,1, ldraw_lib__s__2431s01()],
// 1 16 0 0 0 1 0 0 0 1 0 0 0 1 s\2431p02s01.dat
  [1,16,0,0,0,1,0,0,0,1,0,0,0,1, ldraw_lib__s__2431p02s01()],
// 1 0 0 0 0 1 0 0 0 1 0 0 0 1 s\2431p02s02.dat
  [1,0,0,0,0,1,0,0,0,1,0,0,0,1, ldraw_lib__s__2431p02s02()],
// 1 16 0 0 0 1 0 0 0 1 0 0 0 1 s\2431p02s03.dat
  [1,16,0,0,0,1,0,0,0,1,0,0,0,1, ldraw_lib__s__2431p02s03()],
// 1 16 0 0 0 -1 0 0 0 1 0 0 0 -1 s\2431p02s03.dat
  [1,16,0,0,0,-1,0,0,0,1,0,0,0,-1, ldraw_lib__s__2431p02s03()],
];
module ldraw_lib__2431p52(step=0, col=false, unit=2/5, alt=false, line=0.2, solid=!$preview)
    makepoly(ldraw_lib__2431p52(), step=step, col=col, unit=unit, alt=alt, line=line, solid=solid);
ldraw_lib__2431p52(line=0.2);
